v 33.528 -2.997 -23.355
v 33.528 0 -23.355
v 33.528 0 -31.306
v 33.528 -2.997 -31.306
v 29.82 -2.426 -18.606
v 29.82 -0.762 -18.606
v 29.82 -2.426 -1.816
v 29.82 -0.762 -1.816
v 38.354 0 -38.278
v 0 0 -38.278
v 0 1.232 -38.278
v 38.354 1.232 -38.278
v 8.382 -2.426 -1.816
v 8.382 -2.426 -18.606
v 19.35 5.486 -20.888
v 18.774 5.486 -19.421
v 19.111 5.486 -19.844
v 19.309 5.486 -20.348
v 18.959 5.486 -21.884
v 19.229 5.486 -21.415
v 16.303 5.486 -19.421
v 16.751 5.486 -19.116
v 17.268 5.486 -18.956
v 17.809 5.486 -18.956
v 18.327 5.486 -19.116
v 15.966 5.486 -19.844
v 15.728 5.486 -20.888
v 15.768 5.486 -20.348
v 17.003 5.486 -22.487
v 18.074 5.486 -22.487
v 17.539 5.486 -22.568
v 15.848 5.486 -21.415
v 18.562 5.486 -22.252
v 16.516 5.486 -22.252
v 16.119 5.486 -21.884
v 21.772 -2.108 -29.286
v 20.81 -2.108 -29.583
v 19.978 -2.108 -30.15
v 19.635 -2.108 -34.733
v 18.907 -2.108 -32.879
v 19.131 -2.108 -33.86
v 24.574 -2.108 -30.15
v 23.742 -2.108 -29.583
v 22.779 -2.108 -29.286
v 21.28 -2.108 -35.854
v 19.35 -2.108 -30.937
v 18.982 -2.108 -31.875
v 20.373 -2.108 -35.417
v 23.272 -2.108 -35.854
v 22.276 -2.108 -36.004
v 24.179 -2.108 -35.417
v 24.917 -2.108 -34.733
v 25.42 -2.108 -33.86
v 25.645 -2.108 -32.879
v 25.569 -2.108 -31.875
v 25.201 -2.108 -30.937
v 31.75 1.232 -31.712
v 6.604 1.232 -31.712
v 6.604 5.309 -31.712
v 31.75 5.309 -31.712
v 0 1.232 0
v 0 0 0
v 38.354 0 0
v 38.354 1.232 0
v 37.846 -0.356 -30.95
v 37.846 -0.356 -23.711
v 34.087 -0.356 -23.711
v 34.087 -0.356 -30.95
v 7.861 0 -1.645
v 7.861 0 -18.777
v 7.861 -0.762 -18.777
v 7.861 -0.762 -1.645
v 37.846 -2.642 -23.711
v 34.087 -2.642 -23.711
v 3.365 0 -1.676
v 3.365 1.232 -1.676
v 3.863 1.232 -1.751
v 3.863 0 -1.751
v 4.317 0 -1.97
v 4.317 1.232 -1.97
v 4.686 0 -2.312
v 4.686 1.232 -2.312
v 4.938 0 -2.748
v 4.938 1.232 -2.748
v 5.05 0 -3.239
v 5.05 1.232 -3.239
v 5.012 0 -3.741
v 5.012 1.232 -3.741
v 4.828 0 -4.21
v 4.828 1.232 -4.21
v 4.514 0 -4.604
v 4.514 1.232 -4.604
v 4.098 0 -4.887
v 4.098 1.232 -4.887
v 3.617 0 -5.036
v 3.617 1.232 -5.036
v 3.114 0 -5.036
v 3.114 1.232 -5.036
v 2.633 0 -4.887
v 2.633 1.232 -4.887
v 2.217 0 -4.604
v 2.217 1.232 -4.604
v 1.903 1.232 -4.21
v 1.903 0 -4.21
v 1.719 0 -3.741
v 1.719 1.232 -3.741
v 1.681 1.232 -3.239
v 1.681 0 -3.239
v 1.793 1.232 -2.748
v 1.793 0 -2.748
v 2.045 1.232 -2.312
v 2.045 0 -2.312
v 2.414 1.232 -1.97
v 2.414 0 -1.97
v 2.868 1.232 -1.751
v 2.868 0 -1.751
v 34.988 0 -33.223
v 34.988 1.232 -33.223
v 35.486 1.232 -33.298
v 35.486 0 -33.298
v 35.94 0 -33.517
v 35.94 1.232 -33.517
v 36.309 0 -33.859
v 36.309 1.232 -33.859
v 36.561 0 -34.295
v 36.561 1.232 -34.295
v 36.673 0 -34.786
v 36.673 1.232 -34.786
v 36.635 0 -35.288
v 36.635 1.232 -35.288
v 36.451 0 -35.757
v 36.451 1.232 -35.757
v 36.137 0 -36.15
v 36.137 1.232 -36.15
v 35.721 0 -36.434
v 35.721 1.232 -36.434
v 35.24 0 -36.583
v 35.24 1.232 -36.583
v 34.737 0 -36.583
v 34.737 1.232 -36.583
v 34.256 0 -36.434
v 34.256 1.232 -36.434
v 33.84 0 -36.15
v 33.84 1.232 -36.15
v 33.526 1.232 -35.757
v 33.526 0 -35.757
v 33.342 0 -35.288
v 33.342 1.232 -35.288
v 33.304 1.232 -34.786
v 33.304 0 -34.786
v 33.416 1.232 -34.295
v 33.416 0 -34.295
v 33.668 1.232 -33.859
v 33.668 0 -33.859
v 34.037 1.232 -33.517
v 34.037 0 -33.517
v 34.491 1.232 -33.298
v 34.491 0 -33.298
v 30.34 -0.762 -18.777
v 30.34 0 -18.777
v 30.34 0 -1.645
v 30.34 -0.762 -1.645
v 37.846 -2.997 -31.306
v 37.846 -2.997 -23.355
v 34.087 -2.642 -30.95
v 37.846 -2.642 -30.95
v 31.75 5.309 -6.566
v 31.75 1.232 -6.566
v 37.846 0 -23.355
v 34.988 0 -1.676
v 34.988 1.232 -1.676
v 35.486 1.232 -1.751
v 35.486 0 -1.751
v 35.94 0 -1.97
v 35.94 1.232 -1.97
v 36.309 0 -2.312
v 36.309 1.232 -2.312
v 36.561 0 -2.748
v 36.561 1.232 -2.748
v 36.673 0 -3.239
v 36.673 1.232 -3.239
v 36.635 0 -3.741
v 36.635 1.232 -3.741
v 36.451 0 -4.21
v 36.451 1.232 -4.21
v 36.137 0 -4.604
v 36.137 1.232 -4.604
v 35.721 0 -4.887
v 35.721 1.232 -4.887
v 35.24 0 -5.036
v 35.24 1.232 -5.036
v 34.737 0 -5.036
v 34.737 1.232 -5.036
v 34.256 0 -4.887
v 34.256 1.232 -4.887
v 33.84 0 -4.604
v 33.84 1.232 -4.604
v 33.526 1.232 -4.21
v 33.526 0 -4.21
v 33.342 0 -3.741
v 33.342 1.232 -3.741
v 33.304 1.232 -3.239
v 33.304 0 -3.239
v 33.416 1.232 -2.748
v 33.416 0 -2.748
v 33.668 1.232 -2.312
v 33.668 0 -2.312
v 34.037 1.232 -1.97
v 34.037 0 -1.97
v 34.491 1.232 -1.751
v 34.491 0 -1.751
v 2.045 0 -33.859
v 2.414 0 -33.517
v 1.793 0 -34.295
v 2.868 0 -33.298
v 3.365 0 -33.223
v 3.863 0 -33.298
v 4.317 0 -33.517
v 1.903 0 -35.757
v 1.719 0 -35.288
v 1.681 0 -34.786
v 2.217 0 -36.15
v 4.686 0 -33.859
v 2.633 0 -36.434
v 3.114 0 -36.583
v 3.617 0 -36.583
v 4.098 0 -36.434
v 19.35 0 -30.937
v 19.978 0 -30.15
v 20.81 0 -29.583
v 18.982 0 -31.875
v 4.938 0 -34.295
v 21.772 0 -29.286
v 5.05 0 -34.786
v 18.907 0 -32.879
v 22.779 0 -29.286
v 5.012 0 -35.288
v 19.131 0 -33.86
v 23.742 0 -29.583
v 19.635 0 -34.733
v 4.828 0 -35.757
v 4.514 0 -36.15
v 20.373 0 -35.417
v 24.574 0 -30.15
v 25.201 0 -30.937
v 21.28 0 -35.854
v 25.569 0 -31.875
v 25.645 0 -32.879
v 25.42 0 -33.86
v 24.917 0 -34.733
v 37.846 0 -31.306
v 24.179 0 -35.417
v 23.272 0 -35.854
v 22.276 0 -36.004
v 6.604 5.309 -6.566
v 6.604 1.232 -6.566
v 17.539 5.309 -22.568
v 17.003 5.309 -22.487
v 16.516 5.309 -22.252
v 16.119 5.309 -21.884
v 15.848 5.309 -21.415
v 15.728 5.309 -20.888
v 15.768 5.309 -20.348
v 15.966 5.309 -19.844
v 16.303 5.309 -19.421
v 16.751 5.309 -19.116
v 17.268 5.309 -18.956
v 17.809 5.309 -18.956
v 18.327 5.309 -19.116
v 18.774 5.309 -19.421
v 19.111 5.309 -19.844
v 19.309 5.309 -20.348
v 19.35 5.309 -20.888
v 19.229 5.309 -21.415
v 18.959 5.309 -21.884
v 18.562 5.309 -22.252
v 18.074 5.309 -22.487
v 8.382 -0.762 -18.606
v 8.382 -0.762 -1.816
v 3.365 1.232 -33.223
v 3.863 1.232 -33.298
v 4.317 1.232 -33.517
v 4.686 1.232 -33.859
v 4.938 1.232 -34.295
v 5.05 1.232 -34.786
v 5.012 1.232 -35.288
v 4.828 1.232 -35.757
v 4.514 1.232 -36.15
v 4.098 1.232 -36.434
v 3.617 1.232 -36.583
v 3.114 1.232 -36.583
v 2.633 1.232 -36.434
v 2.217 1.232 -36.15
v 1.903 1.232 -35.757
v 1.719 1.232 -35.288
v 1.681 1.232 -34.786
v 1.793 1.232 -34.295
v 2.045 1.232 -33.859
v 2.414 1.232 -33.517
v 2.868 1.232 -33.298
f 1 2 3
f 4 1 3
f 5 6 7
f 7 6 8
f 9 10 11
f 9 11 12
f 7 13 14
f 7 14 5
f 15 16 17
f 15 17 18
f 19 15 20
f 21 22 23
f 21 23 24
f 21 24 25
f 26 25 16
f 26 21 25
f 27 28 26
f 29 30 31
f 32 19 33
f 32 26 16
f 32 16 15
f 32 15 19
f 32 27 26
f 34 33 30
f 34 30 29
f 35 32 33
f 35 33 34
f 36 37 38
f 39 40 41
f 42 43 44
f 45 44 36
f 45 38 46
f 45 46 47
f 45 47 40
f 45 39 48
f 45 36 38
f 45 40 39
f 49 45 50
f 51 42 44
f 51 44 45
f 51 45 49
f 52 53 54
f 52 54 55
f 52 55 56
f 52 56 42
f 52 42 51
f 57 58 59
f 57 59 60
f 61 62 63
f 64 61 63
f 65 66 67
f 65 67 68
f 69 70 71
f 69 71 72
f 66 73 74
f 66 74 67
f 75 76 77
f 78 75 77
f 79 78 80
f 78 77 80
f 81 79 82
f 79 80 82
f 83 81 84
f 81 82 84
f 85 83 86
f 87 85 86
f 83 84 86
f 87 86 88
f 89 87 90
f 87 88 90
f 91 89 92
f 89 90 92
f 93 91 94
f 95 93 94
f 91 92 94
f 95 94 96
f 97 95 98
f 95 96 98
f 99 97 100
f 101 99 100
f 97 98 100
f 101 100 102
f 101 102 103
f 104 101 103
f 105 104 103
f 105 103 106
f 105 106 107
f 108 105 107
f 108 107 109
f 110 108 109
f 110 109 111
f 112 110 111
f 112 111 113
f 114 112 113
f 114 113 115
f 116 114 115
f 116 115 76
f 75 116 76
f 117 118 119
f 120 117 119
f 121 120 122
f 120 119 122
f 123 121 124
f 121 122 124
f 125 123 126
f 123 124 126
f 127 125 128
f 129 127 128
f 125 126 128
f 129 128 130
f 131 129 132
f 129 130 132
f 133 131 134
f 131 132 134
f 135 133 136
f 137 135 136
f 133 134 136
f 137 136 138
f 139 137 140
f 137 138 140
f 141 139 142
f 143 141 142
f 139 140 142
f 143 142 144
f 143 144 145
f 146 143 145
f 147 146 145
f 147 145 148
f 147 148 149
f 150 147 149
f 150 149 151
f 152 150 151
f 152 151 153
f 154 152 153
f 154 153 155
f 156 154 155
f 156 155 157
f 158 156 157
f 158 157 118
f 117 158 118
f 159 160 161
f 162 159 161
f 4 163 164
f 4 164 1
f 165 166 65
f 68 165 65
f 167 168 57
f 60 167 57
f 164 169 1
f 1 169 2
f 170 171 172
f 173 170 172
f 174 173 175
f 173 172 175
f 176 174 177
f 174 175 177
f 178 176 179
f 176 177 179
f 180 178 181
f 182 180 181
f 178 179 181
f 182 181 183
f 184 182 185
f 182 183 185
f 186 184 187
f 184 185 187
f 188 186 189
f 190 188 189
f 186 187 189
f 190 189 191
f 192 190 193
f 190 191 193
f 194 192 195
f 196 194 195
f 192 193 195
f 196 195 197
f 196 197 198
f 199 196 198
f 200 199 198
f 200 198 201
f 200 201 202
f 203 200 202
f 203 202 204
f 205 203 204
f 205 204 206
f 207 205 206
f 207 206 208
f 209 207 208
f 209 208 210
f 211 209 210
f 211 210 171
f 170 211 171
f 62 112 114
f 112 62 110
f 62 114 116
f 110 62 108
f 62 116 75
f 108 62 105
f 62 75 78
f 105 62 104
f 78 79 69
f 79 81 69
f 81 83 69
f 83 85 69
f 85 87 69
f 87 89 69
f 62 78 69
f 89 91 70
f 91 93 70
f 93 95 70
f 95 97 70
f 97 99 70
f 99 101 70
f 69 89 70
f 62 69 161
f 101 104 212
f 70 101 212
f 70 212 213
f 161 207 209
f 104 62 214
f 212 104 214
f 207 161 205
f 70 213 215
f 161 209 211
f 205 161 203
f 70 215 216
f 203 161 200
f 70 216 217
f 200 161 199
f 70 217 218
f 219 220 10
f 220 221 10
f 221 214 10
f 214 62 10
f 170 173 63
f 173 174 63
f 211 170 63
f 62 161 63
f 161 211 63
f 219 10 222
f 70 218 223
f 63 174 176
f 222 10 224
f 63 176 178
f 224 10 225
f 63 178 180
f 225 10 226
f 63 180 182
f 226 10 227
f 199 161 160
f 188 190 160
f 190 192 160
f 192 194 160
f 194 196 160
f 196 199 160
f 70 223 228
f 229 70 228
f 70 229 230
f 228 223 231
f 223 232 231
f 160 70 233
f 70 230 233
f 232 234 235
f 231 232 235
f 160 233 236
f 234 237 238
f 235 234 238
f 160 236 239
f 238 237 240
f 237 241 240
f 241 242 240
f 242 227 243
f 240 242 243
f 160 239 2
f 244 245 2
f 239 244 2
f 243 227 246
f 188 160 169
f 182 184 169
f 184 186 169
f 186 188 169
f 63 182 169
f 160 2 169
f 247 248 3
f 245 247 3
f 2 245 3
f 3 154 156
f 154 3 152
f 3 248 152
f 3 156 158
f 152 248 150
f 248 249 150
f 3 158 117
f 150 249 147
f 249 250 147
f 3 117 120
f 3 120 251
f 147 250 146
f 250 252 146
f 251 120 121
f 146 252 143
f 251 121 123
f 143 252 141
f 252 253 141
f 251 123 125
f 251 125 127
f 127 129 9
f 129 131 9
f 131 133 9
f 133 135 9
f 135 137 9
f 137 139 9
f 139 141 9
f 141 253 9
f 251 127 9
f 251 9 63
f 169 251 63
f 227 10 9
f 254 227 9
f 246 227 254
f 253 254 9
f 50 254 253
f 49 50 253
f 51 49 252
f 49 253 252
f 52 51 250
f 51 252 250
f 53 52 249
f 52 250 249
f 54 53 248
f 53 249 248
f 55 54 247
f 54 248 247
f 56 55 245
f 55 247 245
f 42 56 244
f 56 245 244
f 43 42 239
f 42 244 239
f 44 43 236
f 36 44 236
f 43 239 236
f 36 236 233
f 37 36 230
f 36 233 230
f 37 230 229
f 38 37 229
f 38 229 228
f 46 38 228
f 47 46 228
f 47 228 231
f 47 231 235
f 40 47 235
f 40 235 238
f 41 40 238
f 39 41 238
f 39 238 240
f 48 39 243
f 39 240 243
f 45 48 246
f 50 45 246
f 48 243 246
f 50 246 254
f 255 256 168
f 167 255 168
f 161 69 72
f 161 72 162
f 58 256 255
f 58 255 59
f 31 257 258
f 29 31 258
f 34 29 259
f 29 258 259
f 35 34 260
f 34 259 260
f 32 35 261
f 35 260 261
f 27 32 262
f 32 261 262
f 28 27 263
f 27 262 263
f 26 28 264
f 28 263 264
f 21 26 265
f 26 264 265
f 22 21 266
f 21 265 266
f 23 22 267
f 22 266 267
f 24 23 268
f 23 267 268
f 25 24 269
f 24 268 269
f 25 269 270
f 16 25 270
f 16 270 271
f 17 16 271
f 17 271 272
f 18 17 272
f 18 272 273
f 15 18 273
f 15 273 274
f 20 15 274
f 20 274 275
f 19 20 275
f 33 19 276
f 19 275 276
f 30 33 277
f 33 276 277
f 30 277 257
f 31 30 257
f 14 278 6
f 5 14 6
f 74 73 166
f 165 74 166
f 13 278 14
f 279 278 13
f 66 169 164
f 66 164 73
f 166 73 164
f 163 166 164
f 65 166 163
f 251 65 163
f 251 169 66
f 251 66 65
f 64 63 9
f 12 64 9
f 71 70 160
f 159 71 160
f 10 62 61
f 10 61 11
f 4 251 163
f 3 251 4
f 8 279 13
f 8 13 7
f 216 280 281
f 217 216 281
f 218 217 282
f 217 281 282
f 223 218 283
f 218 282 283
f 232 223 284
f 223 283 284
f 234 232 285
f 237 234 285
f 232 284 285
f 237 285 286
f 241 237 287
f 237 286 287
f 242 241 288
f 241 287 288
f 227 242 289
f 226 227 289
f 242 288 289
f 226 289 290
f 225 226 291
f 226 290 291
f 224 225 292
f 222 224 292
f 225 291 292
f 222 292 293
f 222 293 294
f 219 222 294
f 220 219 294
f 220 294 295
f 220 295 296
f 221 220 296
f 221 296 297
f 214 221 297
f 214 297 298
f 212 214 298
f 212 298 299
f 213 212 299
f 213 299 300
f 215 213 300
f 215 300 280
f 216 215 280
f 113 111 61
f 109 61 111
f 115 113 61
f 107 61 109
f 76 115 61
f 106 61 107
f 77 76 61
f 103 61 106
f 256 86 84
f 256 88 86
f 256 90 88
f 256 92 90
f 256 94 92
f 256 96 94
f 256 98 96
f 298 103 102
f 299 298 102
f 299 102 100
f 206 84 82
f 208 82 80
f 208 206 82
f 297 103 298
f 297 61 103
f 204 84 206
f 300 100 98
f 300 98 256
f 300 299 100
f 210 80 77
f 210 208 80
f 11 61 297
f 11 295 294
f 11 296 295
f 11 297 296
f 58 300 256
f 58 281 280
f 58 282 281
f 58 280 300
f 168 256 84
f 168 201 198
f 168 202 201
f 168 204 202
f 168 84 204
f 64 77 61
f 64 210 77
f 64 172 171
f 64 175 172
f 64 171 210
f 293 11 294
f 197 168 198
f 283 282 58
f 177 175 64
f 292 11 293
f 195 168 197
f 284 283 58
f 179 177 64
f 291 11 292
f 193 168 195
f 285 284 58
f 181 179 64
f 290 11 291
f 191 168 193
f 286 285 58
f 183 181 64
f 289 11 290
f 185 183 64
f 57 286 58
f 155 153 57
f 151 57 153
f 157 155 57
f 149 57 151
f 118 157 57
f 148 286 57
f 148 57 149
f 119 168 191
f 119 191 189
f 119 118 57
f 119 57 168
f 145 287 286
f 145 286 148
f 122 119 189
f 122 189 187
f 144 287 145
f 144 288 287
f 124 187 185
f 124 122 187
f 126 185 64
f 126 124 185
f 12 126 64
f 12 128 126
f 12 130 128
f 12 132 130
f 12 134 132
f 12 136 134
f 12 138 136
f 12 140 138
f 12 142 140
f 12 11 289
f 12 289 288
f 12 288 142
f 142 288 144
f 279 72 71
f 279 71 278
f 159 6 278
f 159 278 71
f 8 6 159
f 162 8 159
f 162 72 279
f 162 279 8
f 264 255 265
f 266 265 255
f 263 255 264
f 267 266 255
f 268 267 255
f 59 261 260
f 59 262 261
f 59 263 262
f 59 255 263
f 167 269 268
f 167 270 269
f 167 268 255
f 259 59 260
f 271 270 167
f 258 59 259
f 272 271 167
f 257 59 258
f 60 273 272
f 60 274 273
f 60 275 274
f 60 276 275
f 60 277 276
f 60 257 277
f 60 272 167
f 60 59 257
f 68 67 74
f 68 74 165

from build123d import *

# Parameters (mm, degrees)
SKETCH1_W           = 38.354
SKETCH1_H           = 38.2778
BOARD_DEPTH         = 1.2319
SKETCH3_W           = 25.146
SKETCH3_H           = 25.146
GPS_DEPTH           = 4.0767
SKETCH5_W           = 21.4376
SKETCH5_H           = 16.7894
UBLOCK_CHIP_DEPTH   = 2.4257
SKETCH6_R           = 3.3782
BATTERY_DEPTH       = 2.1082
SKETCH7_W           = 4.318
SKETCH7_H           = 7.9502
CONNECTOR_DEPTH     = 2.9972
SKETCH8_W           = 7.239
SKETCH8_H           = 2.286
CUT_EXTRUDE1_DEPTH  = 3.7592
CUT_EXTRUDE2_REACH  = 56.352
SKETCH9_R           = 1.6891
SKETCH10_R          = 1.8161
BOSS_EXTRUDE6_DEPTH = 0.1778
SKETCH11_W          = 22.479
SKETCH11_H          = 17.1323
BOSS_EXTRUDE7_DEPTH = 0.762


with BuildPart() as part:
    # Sketch1 → Board (new body)
    with BuildSketch(Plane(origin=(0, 0, 0), x_dir=(1, 0, 0), z_dir=(0, 1, 0))):
        with Locations((19.177, 19.1389)):
            Rectangle(SKETCH1_W, SKETCH1_H)
    extrude(amount=BOARD_DEPTH)

    # Sketch3 → GPS (add)
    with BuildSketch(Plane(origin=(0, 1.2319, 0), x_dir=(1, 0, 0), z_dir=(0, 1, 0))):
        with Locations((19.177, 19.1389)):
            Rectangle(SKETCH3_W, SKETCH3_H)
    extrude(amount=GPS_DEPTH)

    # Sketch5 → uBlock chip (add)
    with BuildSketch(Plane.XZ):
        with Locations((19.1008, -10.2108)):
            Rectangle(SKETCH5_W, SKETCH5_H)
    extrude(amount=UBLOCK_CHIP_DEPTH)

    # Sketch6 → Battery (add)
    with BuildSketch(Plane(origin=(0, 0, 0), x_dir=(-1, 0, 0), z_dir=(0, -1, 0))):
        with Locations(Location((-22.2758, 32.6263, 0), (0, 0, 90))):
            Circle(SKETCH6_R)
    extrude(amount=BATTERY_DEPTH)

    # Sketch7 → Connector (add)
    with BuildSketch(Plane(origin=(0, 0, 0), x_dir=(-1, 0, 0), z_dir=(0, -1, 0))):
        with Locations((-35.687, 27.3304)):
            Rectangle(SKETCH7_W, SKETCH7_H)
    extrude(amount=CONNECTOR_DEPTH)

    # Sketch8 → Cut-Extrude1 (cut)
    with BuildSketch(Plane(origin=(37.846, 0, 0), x_dir=(0, 0, -1), z_dir=(1, 0, 0))):
        with Locations((27.3304, -1.4986)):
            Rectangle(SKETCH8_W, SKETCH8_H)
    extrude(amount=-CUT_EXTRUDE1_DEPTH, mode=Mode.SUBTRACT)

    # Sketch9 → Cut-Extrude2 (cut, up to next)
    with BuildSketch(Plane(origin=(0, 1.2319, 0), x_dir=(1, 0, 0), z_dir=(0, 1, 0)), mode=Mode.PRIVATE) as cut_extrude2_sk1:
        with Locations(Location((34.9885, 3.3655, 0), (0, 0, 270))):
            Circle(SKETCH9_R)
    cut_extrude2_tool1 = extrude(cut_extrude2_sk1.sketch, amount=-CUT_EXTRUDE2_REACH, mode=Mode.PRIVATE) & part.part
    # Sketch9 → Cut-Extrude2 (cut, up to next)
    with BuildSketch(Plane(origin=(0, 1.2319, 0), x_dir=(1, 0, 0), z_dir=(0, 1, 0)), mode=Mode.PRIVATE) as cut_extrude2_sk2:
        with Locations(Location((3.3655, 3.3655, 0), (0, 0, 270))):
            Circle(SKETCH9_R)
    cut_extrude2_tool2 = extrude(cut_extrude2_sk2.sketch, amount=-CUT_EXTRUDE2_REACH, mode=Mode.PRIVATE) & part.part
    # Sketch9 → Cut-Extrude2 (cut, up to next)
    with BuildSketch(Plane(origin=(0, 1.2319, 0), x_dir=(1, 0, 0), z_dir=(0, 1, 0)), mode=Mode.PRIVATE) as cut_extrude2_sk3:
        with Locations(Location((3.3655, 34.9123, 0), (0, 0, 270))):
            Circle(SKETCH9_R)
    cut_extrude2_tool3 = extrude(cut_extrude2_sk3.sketch, amount=-CUT_EXTRUDE2_REACH, mode=Mode.PRIVATE) & part.part
    # Sketch9 → Cut-Extrude2 (cut, up to next)
    with BuildSketch(Plane(origin=(0, 1.2319, 0), x_dir=(1, 0, 0), z_dir=(0, 1, 0)), mode=Mode.PRIVATE) as cut_extrude2_sk4:
        with Locations(Location((34.9885, 34.9123, 0), (0, 0, 270))):
            Circle(SKETCH9_R)
    cut_extrude2_tool4 = extrude(cut_extrude2_sk4.sketch, amount=-CUT_EXTRUDE2_REACH, mode=Mode.PRIVATE) & part.part
    add(cut_extrude2_tool1.solids().sort_by_distance((34.9885, 1.2319, -3.3655))[0], mode=Mode.SUBTRACT)
    add(cut_extrude2_tool2.solids().sort_by_distance((3.3655, 1.2319, -3.3655))[0], mode=Mode.SUBTRACT)
    add(cut_extrude2_tool3.solids().sort_by_distance((3.3655, 1.2319, -34.9123))[0], mode=Mode.SUBTRACT)
    add(cut_extrude2_tool4.solids().sort_by_distance((34.9885, 1.2319, -34.9123))[0], mode=Mode.SUBTRACT)

    # Sketch10 → Boss-Extrude6 (add)
    with BuildSketch(Plane(origin=(0, 5.3086, 0), x_dir=(1, 0, 0), z_dir=(0, 1, 0))):
        with Locations(Location((17.5387, 20.7518, 0), (0, 0, 90))):
            Circle(SKETCH10_R)
    extrude(amount=BOSS_EXTRUDE6_DEPTH)

    # Sketch11 → Boss-Extrude7 (add)
    with BuildSketch(Plane.XZ):
        with Locations((19.1008, -10.2108)):
            Rectangle(SKETCH11_W, SKETCH11_H)
    extrude(amount=BOSS_EXTRUDE7_DEPTH)


solid = part.part
